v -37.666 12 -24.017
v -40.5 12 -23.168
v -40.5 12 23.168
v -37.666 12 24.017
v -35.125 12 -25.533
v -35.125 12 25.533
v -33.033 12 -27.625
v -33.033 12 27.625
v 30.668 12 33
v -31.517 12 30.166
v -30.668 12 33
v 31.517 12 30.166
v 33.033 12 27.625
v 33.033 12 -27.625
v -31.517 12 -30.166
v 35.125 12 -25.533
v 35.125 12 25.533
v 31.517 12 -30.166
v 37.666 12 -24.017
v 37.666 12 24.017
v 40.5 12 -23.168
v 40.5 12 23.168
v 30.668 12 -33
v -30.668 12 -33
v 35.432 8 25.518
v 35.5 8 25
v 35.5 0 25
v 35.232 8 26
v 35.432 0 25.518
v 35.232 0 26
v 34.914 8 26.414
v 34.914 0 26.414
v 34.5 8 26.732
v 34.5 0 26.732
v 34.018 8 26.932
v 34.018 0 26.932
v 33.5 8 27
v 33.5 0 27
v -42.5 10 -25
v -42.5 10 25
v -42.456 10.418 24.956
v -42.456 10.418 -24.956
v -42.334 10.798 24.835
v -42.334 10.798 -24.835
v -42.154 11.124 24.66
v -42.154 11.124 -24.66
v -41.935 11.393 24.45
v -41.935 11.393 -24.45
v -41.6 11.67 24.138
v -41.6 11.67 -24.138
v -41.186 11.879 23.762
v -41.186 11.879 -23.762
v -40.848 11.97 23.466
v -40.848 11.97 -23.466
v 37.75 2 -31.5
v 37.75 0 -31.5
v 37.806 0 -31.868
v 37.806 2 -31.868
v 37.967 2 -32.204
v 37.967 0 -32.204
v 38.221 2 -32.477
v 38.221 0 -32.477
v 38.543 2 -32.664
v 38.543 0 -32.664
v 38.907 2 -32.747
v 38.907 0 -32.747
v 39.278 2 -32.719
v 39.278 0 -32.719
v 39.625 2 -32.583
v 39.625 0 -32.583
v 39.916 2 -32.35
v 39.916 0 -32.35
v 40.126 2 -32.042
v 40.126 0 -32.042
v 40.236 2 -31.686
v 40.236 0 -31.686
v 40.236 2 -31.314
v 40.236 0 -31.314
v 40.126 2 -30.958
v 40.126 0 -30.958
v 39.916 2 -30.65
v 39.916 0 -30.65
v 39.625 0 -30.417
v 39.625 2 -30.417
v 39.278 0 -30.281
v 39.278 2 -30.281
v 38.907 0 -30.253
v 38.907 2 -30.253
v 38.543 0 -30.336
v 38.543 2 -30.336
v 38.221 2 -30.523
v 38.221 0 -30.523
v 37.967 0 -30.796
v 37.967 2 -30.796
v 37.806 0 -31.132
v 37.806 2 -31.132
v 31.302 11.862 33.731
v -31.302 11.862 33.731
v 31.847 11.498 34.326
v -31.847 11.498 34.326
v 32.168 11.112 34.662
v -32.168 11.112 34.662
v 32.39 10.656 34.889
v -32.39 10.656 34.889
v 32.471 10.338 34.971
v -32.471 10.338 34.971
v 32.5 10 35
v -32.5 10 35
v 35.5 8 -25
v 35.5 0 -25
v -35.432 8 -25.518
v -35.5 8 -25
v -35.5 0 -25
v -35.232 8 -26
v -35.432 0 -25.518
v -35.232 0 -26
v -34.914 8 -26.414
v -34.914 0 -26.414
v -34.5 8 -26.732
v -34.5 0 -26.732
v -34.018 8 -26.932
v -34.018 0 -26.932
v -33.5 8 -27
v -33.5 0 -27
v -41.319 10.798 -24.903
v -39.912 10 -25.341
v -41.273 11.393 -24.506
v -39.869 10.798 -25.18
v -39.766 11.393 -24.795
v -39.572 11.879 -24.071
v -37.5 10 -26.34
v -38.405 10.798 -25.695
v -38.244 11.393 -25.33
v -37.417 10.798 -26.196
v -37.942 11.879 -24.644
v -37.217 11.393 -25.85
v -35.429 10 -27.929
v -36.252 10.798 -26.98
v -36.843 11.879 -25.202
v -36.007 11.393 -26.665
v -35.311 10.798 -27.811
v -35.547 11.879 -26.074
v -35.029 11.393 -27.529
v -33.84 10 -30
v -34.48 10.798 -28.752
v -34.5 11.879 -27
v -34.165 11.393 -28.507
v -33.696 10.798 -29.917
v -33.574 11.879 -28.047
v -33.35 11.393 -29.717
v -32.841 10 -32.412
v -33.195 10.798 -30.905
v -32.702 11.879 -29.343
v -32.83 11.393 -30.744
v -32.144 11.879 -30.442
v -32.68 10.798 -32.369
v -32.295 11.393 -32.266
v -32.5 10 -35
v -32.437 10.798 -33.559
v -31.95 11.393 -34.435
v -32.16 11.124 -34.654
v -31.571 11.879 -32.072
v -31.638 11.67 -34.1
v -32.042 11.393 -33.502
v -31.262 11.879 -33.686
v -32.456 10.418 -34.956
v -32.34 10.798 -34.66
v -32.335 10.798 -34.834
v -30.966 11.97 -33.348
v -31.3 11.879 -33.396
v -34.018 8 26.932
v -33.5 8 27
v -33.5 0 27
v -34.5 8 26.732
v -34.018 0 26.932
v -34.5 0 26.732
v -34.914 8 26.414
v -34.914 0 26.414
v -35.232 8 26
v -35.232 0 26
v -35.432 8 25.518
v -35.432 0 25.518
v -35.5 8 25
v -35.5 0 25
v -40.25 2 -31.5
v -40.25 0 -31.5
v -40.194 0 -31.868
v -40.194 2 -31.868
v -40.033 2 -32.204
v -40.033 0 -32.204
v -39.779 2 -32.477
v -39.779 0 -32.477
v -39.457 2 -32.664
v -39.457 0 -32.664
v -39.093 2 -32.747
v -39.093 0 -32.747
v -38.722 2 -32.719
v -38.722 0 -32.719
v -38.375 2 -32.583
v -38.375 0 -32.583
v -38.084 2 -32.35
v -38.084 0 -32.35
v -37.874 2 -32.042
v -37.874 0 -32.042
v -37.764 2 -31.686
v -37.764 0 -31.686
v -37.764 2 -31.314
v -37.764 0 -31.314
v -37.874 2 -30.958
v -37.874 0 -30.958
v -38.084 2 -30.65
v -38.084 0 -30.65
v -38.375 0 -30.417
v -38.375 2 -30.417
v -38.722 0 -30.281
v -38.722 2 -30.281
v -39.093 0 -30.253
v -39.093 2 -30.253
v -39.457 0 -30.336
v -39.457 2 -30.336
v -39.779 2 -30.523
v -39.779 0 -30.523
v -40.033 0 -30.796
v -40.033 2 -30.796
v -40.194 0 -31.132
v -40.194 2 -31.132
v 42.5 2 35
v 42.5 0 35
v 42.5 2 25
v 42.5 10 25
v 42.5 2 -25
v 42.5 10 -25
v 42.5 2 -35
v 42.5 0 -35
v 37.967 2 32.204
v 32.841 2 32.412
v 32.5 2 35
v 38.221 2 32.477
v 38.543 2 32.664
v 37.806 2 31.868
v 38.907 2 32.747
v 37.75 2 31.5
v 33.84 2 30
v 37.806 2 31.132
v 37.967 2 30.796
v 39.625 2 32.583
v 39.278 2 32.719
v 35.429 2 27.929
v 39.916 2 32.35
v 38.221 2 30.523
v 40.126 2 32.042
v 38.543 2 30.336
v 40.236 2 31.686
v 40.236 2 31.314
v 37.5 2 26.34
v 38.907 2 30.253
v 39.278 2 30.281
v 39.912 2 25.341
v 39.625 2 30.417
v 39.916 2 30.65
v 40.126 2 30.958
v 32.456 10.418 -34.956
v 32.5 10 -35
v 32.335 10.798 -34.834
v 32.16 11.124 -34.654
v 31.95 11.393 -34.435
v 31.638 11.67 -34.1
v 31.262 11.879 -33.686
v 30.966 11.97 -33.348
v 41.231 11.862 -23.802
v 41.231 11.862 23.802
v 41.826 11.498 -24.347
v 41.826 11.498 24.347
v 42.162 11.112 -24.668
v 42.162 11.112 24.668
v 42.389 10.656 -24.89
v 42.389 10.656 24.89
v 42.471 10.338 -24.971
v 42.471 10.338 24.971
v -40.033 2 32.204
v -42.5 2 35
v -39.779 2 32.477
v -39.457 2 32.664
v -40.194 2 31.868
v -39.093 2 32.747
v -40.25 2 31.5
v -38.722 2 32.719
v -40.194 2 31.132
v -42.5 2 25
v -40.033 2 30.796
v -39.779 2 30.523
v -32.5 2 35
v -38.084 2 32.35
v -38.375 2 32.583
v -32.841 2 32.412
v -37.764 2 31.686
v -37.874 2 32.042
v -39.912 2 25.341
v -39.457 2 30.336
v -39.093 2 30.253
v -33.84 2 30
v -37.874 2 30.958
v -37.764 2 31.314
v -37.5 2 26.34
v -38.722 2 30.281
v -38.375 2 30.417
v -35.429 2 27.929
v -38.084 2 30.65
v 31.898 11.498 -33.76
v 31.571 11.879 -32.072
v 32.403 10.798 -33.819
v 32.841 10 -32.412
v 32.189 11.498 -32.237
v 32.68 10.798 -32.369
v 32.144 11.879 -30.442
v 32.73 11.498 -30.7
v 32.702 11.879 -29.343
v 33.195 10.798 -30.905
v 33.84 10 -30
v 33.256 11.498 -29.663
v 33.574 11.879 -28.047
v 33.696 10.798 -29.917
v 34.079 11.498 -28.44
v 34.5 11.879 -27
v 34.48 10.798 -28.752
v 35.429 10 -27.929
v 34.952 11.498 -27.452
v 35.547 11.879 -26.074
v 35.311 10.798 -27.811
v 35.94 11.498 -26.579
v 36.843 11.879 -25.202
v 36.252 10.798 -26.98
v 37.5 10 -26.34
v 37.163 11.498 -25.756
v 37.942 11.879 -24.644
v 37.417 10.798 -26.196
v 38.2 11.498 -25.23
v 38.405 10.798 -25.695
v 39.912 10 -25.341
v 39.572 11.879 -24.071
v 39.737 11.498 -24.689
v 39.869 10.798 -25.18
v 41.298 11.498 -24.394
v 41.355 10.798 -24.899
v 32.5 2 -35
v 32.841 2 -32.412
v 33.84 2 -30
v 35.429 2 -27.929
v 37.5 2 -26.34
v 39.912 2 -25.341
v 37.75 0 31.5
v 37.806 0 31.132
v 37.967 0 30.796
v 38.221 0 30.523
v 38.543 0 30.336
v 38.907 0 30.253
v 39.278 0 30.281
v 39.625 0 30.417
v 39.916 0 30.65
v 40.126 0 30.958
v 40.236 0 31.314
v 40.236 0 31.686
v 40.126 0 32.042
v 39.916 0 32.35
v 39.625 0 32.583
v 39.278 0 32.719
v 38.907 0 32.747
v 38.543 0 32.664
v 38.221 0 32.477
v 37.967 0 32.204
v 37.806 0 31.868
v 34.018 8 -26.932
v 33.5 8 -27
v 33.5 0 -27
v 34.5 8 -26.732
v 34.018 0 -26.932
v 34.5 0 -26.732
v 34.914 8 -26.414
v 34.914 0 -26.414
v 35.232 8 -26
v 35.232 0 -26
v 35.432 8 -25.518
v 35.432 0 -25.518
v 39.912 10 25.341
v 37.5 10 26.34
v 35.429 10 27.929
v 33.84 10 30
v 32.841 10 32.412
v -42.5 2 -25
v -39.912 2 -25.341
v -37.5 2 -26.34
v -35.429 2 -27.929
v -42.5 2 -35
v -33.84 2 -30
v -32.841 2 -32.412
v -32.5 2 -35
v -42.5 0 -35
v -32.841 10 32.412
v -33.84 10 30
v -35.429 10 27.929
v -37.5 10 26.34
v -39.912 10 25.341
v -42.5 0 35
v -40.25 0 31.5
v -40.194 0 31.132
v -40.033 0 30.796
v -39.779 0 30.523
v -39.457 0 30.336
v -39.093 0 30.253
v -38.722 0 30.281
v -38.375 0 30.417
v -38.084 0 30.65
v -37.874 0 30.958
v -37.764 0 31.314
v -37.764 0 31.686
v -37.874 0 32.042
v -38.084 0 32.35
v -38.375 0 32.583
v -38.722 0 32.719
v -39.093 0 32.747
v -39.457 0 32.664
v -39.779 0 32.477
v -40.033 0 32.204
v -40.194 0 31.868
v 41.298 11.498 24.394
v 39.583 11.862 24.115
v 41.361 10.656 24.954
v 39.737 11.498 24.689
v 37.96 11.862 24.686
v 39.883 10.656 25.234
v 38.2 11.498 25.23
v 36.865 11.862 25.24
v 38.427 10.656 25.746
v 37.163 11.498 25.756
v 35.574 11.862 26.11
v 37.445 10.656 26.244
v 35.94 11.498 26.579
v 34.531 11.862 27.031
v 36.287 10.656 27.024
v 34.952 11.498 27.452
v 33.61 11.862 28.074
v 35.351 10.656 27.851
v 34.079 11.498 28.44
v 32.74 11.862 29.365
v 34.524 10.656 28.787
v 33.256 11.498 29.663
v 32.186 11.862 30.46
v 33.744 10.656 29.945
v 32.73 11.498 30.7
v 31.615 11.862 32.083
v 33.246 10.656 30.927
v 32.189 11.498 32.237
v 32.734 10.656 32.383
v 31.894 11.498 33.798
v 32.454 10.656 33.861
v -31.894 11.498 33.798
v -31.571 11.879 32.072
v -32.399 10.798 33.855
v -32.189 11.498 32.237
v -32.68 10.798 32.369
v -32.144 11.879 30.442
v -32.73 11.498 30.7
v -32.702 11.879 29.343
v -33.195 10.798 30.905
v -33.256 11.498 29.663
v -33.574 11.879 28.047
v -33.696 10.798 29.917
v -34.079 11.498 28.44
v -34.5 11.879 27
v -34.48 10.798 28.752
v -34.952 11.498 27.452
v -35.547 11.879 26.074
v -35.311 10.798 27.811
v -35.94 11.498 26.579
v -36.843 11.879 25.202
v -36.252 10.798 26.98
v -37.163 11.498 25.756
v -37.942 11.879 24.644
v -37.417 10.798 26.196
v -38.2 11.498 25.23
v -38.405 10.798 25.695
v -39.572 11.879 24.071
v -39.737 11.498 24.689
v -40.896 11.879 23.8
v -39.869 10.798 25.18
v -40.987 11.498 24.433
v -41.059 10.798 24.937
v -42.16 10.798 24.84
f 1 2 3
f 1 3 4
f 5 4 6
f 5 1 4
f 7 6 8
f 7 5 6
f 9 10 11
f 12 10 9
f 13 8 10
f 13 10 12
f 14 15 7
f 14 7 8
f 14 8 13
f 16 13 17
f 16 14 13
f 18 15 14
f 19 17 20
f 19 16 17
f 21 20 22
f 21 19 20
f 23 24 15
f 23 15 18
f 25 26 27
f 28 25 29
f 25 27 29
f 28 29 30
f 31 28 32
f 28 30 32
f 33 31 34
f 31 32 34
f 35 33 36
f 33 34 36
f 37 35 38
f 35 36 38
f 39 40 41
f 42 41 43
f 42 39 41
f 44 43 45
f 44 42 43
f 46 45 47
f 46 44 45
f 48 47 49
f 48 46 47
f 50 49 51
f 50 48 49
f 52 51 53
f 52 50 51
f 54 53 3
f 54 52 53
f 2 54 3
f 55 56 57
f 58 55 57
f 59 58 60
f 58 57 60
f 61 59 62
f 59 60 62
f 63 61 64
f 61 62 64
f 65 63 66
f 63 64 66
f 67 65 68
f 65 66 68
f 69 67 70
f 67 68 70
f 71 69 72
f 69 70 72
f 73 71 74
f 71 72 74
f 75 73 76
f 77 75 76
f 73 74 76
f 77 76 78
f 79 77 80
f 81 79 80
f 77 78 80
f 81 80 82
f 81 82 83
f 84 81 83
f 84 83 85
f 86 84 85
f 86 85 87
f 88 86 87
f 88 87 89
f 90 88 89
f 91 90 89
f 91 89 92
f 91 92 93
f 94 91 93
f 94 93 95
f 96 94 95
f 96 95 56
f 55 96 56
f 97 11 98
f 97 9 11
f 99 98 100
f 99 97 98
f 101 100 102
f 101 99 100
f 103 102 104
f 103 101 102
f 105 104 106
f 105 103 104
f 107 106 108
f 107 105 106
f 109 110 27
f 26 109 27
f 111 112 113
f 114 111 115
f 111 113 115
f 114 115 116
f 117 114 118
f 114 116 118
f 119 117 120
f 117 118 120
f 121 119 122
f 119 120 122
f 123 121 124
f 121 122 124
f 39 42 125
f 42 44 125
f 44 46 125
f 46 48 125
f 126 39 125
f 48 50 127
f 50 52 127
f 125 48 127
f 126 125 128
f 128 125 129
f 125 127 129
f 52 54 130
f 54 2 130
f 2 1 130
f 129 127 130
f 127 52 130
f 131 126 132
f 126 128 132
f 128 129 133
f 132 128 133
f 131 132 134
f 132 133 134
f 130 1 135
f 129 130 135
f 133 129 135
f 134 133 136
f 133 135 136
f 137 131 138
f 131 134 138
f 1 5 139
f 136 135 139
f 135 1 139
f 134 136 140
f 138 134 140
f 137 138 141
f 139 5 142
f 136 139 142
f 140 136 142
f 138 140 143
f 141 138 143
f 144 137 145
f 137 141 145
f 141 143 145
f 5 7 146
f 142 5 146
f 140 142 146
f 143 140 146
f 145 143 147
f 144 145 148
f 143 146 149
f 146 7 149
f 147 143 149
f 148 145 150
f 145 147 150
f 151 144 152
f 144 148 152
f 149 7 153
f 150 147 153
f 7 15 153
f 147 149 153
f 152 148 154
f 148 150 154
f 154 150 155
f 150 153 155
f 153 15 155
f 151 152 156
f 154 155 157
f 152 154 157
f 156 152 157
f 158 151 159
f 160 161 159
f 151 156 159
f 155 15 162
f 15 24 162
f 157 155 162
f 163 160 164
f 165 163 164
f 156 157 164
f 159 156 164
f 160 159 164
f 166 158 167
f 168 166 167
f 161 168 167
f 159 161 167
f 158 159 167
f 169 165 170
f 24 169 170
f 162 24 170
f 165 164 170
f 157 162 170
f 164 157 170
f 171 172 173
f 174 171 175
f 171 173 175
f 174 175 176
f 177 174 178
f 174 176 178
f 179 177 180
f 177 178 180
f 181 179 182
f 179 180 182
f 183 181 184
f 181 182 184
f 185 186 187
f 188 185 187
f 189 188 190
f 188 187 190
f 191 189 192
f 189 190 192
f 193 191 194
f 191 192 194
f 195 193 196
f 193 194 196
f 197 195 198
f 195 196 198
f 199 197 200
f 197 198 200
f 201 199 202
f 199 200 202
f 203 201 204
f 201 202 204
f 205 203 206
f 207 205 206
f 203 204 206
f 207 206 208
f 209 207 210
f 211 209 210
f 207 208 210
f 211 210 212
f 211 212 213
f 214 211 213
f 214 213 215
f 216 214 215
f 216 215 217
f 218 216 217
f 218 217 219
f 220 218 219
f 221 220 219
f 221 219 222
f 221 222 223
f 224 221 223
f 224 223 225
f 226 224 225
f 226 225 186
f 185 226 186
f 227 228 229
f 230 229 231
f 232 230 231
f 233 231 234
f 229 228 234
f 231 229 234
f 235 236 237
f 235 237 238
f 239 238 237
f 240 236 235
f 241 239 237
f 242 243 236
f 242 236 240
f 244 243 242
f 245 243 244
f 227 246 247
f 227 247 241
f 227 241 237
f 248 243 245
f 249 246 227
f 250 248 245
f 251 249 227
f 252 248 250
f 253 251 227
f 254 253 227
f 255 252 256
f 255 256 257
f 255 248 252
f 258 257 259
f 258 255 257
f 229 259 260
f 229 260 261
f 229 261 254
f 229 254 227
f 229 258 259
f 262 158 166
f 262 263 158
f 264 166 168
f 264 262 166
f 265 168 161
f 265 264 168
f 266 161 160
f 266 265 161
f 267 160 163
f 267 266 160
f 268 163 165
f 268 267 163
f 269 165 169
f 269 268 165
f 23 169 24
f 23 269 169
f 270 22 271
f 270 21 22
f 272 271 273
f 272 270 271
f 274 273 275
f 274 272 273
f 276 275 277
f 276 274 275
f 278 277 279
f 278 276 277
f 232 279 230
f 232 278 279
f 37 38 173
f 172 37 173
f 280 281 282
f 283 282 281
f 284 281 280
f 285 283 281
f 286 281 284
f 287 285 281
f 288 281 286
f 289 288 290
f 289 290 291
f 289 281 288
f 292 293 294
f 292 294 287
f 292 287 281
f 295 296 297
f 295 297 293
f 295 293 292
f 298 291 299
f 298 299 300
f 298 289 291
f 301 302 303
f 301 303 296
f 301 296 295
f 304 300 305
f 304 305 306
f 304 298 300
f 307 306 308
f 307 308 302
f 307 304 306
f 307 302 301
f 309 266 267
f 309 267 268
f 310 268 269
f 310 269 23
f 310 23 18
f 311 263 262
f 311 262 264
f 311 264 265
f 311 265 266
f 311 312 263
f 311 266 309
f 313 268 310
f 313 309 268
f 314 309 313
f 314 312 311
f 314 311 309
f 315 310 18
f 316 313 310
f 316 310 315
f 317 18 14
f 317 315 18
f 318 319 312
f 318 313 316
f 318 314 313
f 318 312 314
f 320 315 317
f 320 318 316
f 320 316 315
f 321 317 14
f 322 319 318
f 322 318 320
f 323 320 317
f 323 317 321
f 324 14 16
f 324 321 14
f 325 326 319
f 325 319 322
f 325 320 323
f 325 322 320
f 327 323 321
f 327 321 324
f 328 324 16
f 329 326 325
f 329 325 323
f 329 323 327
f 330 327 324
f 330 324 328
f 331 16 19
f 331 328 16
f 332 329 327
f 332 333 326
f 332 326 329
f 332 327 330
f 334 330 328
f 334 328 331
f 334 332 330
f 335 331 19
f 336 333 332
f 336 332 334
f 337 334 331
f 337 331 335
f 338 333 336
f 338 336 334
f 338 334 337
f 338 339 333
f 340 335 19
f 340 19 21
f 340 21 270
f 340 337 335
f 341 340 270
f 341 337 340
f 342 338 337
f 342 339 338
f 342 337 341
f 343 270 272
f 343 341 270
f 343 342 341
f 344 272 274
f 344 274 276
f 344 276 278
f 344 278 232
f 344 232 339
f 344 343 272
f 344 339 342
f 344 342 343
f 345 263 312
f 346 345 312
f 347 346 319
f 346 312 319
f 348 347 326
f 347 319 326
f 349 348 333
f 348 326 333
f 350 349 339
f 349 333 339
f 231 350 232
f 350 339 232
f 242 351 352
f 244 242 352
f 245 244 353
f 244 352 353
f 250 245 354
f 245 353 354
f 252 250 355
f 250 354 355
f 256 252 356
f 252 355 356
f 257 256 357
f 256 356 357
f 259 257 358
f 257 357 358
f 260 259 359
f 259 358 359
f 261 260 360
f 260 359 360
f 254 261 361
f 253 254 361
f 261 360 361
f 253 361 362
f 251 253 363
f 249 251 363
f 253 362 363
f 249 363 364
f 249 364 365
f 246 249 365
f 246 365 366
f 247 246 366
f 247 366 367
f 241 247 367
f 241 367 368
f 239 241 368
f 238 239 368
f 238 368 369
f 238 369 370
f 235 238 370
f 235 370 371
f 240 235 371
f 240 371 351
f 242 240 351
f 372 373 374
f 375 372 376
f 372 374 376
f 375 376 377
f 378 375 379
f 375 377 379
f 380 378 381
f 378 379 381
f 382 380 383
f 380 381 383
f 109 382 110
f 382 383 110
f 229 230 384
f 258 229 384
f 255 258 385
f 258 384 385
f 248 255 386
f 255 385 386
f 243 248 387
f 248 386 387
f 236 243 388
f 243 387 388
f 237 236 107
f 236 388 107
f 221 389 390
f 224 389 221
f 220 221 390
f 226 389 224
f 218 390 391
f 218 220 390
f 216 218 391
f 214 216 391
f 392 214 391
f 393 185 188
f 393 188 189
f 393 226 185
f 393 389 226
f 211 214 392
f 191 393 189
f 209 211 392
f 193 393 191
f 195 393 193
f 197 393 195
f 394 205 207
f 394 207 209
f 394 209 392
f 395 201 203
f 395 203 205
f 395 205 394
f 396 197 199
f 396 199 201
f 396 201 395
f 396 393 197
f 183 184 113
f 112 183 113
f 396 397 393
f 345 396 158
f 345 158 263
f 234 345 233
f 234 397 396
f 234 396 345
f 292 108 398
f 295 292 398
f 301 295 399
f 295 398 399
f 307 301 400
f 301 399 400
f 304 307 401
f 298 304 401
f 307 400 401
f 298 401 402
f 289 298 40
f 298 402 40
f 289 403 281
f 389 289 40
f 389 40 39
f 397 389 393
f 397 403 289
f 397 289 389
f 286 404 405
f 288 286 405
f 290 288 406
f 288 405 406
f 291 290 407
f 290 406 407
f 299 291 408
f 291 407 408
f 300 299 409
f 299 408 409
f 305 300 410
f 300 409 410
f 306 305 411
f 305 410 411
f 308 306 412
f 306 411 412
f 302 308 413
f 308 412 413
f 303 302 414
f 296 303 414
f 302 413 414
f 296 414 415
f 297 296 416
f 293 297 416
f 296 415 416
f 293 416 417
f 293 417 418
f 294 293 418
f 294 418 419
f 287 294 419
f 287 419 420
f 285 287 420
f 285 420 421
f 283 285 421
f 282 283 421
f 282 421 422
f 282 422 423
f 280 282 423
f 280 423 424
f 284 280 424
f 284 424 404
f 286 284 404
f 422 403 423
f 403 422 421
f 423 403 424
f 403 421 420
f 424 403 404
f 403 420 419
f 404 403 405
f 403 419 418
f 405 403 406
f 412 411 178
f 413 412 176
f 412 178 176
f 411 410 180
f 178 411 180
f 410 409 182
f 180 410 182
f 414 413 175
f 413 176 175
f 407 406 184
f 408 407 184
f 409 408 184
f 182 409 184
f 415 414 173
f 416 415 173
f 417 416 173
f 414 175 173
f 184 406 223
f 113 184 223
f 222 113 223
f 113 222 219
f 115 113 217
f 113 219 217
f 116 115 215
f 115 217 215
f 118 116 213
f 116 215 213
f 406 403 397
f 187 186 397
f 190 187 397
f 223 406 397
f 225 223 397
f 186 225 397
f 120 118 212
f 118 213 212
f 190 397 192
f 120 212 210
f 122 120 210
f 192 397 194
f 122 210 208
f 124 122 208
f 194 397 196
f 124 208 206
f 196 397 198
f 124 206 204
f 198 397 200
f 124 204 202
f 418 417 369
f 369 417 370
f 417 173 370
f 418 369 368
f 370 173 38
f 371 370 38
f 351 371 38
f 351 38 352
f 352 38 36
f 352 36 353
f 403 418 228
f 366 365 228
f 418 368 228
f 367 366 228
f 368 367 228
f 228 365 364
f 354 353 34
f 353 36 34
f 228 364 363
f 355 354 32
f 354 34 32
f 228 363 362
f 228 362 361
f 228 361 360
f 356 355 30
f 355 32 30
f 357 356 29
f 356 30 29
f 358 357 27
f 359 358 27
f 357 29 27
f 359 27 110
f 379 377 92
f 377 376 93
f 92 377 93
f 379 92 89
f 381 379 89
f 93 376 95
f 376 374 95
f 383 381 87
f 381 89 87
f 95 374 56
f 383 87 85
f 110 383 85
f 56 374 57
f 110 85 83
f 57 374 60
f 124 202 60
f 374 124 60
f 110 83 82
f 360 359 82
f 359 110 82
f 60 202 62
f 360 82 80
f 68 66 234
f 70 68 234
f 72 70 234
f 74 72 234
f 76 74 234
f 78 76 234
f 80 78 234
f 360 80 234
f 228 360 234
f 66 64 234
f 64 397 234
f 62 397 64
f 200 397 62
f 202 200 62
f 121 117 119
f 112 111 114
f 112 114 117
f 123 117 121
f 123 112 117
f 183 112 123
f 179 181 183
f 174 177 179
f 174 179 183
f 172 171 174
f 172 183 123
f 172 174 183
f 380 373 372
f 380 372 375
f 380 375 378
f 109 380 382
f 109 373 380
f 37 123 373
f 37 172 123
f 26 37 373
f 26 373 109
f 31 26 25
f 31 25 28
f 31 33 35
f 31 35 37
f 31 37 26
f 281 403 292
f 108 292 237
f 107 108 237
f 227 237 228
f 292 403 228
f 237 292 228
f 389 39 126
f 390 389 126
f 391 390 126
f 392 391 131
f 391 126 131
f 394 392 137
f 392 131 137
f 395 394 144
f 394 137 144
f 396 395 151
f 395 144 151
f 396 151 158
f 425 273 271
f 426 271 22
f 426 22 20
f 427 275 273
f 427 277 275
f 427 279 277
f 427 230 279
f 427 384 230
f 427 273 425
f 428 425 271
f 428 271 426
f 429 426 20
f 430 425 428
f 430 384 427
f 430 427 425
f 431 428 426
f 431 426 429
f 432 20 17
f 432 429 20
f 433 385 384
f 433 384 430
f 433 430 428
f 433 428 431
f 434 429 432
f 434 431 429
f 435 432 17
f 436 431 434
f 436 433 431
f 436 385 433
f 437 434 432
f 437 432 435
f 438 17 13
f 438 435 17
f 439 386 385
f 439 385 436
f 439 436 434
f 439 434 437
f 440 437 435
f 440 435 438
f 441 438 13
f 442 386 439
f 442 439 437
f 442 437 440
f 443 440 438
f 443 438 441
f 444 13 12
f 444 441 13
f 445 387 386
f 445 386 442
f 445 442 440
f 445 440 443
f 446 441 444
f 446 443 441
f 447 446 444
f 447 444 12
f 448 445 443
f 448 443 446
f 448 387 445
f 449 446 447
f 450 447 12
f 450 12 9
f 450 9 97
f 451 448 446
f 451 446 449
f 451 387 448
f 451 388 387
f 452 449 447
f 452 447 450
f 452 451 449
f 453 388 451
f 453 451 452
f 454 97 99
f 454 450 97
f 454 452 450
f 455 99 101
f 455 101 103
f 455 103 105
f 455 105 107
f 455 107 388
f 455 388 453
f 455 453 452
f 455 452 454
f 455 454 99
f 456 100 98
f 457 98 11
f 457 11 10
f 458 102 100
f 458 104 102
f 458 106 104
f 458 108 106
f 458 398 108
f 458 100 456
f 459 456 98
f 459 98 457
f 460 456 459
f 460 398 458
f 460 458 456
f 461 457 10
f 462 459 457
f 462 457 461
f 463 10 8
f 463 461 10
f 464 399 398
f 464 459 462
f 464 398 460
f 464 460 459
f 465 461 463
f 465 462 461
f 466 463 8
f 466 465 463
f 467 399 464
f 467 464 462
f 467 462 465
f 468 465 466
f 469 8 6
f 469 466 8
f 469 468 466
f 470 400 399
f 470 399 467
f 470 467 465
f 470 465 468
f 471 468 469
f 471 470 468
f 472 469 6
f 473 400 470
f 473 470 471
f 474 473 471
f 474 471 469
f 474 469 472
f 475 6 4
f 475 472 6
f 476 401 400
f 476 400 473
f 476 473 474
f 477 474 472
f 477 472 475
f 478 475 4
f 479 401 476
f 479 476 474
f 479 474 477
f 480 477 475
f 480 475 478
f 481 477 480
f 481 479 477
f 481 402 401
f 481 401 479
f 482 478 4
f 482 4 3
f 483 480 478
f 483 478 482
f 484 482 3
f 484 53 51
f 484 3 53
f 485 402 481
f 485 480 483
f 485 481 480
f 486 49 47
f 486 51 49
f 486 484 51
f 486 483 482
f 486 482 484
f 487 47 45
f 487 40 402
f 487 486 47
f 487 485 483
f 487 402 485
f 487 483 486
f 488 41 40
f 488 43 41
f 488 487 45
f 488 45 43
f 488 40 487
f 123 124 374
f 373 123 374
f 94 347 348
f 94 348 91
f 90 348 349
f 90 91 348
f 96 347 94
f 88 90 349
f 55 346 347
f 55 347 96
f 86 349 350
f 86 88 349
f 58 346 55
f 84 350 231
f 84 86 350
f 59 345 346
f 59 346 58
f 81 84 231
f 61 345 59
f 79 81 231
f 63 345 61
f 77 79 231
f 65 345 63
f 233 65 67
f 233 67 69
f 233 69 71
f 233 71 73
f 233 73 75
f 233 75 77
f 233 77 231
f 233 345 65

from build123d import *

# Parameters (mm, degrees)
SKETCH2_W                 = 85
SKETCH2_H                 = 70
BOSS_EXTRUDE1_DEPTH       = 12
SKETCH4_R                 = 10
CUT_EXTRUDE3_DEPTH        = 10
FILLET2_R                 = 2
M3X0_5_TAPPED_HOLE1_D     = 2.5
M3X0_5_TAPPED_HOLE1_DEPTH = 10
M3X0_5_TAPPED_HOLE1_TIP   = 0.751075774
CUT_EXTRUDE4_DEPTH        = 8


with BuildPart() as part:
    # Sketch2 → Boss-Extrude1 (new body)
    with BuildSketch(Plane(origin=(0, 0, 0), x_dir=(1, 0, 0), z_dir=(0, 1, 0))):
        Rectangle(SKETCH2_W, SKETCH2_H)
    extrude(amount=BOSS_EXTRUDE1_DEPTH)

    # Sketch4 → Cut-Extrude3 (cut)
    with BuildSketch(Plane(origin=(0, 12, 0), x_dir=(1, 0, 0), z_dir=(0, 1, 0))):
        with Locations((42.5, -35)):
            Circle(SKETCH4_R)
        with Locations((-42.5, -35)):
            Circle(SKETCH4_R)
        with Locations((-42.5, 35)):
            Circle(SKETCH4_R)
        with Locations((42.5, 35)):
            Circle(SKETCH4_R)
    extrude(amount=-CUT_EXTRUDE3_DEPTH, mode=Mode.SUBTRACT)

    # Fillet2
    fillet2_edges = [part.edges().sort_by_distance(p)[0] for p in [
        (42.5, 12, 0),
        (0, 12, -35),
        (-42.5, 12, 0),
        (0, 12, 35),
        (35.428932188, 12, -27.928932188),
        (-35.428932188, 12, -27.928932188),
        (-35.428932188, 12, 27.928932188),
        (35.428932188, 12, 27.928932188),
    ]]
    fillet(fillet2_edges, radius=FILLET2_R)

    # M3x0.5 Tapped Hole1
    with Locations(Plane(origin=(0, 2, 0), x_dir=(1, 0, 0), z_dir=(0, 1, 0))):
        with Locations((-39, 31.5), (-39, -31.5), (39, -31.5), (39, 31.5)):
            Hole(M3X0_5_TAPPED_HOLE1_D / 2, depth=M3X0_5_TAPPED_HOLE1_DEPTH)
            with Locations((0, 0, -(M3X0_5_TAPPED_HOLE1_DEPTH + M3X0_5_TAPPED_HOLE1_TIP / 2))):  # 118° drill point
                Cone(0, M3X0_5_TAPPED_HOLE1_D / 2, M3X0_5_TAPPED_HOLE1_TIP, mode=Mode.SUBTRACT)

    # Sketch8 → Cut-Extrude4 (cut)
    with BuildSketch(Plane.XZ):
        with BuildLine():
            Line((35.5, -25), (35.5, 25))
            ThreePointArc((35.5, 25), (34.914213562, 26.414213562), (33.5, 27))
            Line((33.5, 27), (-33.5, 27))
            ThreePointArc((-33.5, 27), (-34.914213562, 26.414213562), (-35.5, 25))
            Line((-35.5, 25), (-35.5, -25))
            ThreePointArc((-35.5, -25), (-34.914213562, -26.414213562), (-33.5, -27))
            Line((-33.5, -27), (33.5, -27))
            ThreePointArc((33.5, -27), (34.914213562, -26.414213562), (35.5, -25))
        make_face()
    extrude(amount=-CUT_EXTRUDE4_DEPTH, mode=Mode.SUBTRACT)


solid = part.part
